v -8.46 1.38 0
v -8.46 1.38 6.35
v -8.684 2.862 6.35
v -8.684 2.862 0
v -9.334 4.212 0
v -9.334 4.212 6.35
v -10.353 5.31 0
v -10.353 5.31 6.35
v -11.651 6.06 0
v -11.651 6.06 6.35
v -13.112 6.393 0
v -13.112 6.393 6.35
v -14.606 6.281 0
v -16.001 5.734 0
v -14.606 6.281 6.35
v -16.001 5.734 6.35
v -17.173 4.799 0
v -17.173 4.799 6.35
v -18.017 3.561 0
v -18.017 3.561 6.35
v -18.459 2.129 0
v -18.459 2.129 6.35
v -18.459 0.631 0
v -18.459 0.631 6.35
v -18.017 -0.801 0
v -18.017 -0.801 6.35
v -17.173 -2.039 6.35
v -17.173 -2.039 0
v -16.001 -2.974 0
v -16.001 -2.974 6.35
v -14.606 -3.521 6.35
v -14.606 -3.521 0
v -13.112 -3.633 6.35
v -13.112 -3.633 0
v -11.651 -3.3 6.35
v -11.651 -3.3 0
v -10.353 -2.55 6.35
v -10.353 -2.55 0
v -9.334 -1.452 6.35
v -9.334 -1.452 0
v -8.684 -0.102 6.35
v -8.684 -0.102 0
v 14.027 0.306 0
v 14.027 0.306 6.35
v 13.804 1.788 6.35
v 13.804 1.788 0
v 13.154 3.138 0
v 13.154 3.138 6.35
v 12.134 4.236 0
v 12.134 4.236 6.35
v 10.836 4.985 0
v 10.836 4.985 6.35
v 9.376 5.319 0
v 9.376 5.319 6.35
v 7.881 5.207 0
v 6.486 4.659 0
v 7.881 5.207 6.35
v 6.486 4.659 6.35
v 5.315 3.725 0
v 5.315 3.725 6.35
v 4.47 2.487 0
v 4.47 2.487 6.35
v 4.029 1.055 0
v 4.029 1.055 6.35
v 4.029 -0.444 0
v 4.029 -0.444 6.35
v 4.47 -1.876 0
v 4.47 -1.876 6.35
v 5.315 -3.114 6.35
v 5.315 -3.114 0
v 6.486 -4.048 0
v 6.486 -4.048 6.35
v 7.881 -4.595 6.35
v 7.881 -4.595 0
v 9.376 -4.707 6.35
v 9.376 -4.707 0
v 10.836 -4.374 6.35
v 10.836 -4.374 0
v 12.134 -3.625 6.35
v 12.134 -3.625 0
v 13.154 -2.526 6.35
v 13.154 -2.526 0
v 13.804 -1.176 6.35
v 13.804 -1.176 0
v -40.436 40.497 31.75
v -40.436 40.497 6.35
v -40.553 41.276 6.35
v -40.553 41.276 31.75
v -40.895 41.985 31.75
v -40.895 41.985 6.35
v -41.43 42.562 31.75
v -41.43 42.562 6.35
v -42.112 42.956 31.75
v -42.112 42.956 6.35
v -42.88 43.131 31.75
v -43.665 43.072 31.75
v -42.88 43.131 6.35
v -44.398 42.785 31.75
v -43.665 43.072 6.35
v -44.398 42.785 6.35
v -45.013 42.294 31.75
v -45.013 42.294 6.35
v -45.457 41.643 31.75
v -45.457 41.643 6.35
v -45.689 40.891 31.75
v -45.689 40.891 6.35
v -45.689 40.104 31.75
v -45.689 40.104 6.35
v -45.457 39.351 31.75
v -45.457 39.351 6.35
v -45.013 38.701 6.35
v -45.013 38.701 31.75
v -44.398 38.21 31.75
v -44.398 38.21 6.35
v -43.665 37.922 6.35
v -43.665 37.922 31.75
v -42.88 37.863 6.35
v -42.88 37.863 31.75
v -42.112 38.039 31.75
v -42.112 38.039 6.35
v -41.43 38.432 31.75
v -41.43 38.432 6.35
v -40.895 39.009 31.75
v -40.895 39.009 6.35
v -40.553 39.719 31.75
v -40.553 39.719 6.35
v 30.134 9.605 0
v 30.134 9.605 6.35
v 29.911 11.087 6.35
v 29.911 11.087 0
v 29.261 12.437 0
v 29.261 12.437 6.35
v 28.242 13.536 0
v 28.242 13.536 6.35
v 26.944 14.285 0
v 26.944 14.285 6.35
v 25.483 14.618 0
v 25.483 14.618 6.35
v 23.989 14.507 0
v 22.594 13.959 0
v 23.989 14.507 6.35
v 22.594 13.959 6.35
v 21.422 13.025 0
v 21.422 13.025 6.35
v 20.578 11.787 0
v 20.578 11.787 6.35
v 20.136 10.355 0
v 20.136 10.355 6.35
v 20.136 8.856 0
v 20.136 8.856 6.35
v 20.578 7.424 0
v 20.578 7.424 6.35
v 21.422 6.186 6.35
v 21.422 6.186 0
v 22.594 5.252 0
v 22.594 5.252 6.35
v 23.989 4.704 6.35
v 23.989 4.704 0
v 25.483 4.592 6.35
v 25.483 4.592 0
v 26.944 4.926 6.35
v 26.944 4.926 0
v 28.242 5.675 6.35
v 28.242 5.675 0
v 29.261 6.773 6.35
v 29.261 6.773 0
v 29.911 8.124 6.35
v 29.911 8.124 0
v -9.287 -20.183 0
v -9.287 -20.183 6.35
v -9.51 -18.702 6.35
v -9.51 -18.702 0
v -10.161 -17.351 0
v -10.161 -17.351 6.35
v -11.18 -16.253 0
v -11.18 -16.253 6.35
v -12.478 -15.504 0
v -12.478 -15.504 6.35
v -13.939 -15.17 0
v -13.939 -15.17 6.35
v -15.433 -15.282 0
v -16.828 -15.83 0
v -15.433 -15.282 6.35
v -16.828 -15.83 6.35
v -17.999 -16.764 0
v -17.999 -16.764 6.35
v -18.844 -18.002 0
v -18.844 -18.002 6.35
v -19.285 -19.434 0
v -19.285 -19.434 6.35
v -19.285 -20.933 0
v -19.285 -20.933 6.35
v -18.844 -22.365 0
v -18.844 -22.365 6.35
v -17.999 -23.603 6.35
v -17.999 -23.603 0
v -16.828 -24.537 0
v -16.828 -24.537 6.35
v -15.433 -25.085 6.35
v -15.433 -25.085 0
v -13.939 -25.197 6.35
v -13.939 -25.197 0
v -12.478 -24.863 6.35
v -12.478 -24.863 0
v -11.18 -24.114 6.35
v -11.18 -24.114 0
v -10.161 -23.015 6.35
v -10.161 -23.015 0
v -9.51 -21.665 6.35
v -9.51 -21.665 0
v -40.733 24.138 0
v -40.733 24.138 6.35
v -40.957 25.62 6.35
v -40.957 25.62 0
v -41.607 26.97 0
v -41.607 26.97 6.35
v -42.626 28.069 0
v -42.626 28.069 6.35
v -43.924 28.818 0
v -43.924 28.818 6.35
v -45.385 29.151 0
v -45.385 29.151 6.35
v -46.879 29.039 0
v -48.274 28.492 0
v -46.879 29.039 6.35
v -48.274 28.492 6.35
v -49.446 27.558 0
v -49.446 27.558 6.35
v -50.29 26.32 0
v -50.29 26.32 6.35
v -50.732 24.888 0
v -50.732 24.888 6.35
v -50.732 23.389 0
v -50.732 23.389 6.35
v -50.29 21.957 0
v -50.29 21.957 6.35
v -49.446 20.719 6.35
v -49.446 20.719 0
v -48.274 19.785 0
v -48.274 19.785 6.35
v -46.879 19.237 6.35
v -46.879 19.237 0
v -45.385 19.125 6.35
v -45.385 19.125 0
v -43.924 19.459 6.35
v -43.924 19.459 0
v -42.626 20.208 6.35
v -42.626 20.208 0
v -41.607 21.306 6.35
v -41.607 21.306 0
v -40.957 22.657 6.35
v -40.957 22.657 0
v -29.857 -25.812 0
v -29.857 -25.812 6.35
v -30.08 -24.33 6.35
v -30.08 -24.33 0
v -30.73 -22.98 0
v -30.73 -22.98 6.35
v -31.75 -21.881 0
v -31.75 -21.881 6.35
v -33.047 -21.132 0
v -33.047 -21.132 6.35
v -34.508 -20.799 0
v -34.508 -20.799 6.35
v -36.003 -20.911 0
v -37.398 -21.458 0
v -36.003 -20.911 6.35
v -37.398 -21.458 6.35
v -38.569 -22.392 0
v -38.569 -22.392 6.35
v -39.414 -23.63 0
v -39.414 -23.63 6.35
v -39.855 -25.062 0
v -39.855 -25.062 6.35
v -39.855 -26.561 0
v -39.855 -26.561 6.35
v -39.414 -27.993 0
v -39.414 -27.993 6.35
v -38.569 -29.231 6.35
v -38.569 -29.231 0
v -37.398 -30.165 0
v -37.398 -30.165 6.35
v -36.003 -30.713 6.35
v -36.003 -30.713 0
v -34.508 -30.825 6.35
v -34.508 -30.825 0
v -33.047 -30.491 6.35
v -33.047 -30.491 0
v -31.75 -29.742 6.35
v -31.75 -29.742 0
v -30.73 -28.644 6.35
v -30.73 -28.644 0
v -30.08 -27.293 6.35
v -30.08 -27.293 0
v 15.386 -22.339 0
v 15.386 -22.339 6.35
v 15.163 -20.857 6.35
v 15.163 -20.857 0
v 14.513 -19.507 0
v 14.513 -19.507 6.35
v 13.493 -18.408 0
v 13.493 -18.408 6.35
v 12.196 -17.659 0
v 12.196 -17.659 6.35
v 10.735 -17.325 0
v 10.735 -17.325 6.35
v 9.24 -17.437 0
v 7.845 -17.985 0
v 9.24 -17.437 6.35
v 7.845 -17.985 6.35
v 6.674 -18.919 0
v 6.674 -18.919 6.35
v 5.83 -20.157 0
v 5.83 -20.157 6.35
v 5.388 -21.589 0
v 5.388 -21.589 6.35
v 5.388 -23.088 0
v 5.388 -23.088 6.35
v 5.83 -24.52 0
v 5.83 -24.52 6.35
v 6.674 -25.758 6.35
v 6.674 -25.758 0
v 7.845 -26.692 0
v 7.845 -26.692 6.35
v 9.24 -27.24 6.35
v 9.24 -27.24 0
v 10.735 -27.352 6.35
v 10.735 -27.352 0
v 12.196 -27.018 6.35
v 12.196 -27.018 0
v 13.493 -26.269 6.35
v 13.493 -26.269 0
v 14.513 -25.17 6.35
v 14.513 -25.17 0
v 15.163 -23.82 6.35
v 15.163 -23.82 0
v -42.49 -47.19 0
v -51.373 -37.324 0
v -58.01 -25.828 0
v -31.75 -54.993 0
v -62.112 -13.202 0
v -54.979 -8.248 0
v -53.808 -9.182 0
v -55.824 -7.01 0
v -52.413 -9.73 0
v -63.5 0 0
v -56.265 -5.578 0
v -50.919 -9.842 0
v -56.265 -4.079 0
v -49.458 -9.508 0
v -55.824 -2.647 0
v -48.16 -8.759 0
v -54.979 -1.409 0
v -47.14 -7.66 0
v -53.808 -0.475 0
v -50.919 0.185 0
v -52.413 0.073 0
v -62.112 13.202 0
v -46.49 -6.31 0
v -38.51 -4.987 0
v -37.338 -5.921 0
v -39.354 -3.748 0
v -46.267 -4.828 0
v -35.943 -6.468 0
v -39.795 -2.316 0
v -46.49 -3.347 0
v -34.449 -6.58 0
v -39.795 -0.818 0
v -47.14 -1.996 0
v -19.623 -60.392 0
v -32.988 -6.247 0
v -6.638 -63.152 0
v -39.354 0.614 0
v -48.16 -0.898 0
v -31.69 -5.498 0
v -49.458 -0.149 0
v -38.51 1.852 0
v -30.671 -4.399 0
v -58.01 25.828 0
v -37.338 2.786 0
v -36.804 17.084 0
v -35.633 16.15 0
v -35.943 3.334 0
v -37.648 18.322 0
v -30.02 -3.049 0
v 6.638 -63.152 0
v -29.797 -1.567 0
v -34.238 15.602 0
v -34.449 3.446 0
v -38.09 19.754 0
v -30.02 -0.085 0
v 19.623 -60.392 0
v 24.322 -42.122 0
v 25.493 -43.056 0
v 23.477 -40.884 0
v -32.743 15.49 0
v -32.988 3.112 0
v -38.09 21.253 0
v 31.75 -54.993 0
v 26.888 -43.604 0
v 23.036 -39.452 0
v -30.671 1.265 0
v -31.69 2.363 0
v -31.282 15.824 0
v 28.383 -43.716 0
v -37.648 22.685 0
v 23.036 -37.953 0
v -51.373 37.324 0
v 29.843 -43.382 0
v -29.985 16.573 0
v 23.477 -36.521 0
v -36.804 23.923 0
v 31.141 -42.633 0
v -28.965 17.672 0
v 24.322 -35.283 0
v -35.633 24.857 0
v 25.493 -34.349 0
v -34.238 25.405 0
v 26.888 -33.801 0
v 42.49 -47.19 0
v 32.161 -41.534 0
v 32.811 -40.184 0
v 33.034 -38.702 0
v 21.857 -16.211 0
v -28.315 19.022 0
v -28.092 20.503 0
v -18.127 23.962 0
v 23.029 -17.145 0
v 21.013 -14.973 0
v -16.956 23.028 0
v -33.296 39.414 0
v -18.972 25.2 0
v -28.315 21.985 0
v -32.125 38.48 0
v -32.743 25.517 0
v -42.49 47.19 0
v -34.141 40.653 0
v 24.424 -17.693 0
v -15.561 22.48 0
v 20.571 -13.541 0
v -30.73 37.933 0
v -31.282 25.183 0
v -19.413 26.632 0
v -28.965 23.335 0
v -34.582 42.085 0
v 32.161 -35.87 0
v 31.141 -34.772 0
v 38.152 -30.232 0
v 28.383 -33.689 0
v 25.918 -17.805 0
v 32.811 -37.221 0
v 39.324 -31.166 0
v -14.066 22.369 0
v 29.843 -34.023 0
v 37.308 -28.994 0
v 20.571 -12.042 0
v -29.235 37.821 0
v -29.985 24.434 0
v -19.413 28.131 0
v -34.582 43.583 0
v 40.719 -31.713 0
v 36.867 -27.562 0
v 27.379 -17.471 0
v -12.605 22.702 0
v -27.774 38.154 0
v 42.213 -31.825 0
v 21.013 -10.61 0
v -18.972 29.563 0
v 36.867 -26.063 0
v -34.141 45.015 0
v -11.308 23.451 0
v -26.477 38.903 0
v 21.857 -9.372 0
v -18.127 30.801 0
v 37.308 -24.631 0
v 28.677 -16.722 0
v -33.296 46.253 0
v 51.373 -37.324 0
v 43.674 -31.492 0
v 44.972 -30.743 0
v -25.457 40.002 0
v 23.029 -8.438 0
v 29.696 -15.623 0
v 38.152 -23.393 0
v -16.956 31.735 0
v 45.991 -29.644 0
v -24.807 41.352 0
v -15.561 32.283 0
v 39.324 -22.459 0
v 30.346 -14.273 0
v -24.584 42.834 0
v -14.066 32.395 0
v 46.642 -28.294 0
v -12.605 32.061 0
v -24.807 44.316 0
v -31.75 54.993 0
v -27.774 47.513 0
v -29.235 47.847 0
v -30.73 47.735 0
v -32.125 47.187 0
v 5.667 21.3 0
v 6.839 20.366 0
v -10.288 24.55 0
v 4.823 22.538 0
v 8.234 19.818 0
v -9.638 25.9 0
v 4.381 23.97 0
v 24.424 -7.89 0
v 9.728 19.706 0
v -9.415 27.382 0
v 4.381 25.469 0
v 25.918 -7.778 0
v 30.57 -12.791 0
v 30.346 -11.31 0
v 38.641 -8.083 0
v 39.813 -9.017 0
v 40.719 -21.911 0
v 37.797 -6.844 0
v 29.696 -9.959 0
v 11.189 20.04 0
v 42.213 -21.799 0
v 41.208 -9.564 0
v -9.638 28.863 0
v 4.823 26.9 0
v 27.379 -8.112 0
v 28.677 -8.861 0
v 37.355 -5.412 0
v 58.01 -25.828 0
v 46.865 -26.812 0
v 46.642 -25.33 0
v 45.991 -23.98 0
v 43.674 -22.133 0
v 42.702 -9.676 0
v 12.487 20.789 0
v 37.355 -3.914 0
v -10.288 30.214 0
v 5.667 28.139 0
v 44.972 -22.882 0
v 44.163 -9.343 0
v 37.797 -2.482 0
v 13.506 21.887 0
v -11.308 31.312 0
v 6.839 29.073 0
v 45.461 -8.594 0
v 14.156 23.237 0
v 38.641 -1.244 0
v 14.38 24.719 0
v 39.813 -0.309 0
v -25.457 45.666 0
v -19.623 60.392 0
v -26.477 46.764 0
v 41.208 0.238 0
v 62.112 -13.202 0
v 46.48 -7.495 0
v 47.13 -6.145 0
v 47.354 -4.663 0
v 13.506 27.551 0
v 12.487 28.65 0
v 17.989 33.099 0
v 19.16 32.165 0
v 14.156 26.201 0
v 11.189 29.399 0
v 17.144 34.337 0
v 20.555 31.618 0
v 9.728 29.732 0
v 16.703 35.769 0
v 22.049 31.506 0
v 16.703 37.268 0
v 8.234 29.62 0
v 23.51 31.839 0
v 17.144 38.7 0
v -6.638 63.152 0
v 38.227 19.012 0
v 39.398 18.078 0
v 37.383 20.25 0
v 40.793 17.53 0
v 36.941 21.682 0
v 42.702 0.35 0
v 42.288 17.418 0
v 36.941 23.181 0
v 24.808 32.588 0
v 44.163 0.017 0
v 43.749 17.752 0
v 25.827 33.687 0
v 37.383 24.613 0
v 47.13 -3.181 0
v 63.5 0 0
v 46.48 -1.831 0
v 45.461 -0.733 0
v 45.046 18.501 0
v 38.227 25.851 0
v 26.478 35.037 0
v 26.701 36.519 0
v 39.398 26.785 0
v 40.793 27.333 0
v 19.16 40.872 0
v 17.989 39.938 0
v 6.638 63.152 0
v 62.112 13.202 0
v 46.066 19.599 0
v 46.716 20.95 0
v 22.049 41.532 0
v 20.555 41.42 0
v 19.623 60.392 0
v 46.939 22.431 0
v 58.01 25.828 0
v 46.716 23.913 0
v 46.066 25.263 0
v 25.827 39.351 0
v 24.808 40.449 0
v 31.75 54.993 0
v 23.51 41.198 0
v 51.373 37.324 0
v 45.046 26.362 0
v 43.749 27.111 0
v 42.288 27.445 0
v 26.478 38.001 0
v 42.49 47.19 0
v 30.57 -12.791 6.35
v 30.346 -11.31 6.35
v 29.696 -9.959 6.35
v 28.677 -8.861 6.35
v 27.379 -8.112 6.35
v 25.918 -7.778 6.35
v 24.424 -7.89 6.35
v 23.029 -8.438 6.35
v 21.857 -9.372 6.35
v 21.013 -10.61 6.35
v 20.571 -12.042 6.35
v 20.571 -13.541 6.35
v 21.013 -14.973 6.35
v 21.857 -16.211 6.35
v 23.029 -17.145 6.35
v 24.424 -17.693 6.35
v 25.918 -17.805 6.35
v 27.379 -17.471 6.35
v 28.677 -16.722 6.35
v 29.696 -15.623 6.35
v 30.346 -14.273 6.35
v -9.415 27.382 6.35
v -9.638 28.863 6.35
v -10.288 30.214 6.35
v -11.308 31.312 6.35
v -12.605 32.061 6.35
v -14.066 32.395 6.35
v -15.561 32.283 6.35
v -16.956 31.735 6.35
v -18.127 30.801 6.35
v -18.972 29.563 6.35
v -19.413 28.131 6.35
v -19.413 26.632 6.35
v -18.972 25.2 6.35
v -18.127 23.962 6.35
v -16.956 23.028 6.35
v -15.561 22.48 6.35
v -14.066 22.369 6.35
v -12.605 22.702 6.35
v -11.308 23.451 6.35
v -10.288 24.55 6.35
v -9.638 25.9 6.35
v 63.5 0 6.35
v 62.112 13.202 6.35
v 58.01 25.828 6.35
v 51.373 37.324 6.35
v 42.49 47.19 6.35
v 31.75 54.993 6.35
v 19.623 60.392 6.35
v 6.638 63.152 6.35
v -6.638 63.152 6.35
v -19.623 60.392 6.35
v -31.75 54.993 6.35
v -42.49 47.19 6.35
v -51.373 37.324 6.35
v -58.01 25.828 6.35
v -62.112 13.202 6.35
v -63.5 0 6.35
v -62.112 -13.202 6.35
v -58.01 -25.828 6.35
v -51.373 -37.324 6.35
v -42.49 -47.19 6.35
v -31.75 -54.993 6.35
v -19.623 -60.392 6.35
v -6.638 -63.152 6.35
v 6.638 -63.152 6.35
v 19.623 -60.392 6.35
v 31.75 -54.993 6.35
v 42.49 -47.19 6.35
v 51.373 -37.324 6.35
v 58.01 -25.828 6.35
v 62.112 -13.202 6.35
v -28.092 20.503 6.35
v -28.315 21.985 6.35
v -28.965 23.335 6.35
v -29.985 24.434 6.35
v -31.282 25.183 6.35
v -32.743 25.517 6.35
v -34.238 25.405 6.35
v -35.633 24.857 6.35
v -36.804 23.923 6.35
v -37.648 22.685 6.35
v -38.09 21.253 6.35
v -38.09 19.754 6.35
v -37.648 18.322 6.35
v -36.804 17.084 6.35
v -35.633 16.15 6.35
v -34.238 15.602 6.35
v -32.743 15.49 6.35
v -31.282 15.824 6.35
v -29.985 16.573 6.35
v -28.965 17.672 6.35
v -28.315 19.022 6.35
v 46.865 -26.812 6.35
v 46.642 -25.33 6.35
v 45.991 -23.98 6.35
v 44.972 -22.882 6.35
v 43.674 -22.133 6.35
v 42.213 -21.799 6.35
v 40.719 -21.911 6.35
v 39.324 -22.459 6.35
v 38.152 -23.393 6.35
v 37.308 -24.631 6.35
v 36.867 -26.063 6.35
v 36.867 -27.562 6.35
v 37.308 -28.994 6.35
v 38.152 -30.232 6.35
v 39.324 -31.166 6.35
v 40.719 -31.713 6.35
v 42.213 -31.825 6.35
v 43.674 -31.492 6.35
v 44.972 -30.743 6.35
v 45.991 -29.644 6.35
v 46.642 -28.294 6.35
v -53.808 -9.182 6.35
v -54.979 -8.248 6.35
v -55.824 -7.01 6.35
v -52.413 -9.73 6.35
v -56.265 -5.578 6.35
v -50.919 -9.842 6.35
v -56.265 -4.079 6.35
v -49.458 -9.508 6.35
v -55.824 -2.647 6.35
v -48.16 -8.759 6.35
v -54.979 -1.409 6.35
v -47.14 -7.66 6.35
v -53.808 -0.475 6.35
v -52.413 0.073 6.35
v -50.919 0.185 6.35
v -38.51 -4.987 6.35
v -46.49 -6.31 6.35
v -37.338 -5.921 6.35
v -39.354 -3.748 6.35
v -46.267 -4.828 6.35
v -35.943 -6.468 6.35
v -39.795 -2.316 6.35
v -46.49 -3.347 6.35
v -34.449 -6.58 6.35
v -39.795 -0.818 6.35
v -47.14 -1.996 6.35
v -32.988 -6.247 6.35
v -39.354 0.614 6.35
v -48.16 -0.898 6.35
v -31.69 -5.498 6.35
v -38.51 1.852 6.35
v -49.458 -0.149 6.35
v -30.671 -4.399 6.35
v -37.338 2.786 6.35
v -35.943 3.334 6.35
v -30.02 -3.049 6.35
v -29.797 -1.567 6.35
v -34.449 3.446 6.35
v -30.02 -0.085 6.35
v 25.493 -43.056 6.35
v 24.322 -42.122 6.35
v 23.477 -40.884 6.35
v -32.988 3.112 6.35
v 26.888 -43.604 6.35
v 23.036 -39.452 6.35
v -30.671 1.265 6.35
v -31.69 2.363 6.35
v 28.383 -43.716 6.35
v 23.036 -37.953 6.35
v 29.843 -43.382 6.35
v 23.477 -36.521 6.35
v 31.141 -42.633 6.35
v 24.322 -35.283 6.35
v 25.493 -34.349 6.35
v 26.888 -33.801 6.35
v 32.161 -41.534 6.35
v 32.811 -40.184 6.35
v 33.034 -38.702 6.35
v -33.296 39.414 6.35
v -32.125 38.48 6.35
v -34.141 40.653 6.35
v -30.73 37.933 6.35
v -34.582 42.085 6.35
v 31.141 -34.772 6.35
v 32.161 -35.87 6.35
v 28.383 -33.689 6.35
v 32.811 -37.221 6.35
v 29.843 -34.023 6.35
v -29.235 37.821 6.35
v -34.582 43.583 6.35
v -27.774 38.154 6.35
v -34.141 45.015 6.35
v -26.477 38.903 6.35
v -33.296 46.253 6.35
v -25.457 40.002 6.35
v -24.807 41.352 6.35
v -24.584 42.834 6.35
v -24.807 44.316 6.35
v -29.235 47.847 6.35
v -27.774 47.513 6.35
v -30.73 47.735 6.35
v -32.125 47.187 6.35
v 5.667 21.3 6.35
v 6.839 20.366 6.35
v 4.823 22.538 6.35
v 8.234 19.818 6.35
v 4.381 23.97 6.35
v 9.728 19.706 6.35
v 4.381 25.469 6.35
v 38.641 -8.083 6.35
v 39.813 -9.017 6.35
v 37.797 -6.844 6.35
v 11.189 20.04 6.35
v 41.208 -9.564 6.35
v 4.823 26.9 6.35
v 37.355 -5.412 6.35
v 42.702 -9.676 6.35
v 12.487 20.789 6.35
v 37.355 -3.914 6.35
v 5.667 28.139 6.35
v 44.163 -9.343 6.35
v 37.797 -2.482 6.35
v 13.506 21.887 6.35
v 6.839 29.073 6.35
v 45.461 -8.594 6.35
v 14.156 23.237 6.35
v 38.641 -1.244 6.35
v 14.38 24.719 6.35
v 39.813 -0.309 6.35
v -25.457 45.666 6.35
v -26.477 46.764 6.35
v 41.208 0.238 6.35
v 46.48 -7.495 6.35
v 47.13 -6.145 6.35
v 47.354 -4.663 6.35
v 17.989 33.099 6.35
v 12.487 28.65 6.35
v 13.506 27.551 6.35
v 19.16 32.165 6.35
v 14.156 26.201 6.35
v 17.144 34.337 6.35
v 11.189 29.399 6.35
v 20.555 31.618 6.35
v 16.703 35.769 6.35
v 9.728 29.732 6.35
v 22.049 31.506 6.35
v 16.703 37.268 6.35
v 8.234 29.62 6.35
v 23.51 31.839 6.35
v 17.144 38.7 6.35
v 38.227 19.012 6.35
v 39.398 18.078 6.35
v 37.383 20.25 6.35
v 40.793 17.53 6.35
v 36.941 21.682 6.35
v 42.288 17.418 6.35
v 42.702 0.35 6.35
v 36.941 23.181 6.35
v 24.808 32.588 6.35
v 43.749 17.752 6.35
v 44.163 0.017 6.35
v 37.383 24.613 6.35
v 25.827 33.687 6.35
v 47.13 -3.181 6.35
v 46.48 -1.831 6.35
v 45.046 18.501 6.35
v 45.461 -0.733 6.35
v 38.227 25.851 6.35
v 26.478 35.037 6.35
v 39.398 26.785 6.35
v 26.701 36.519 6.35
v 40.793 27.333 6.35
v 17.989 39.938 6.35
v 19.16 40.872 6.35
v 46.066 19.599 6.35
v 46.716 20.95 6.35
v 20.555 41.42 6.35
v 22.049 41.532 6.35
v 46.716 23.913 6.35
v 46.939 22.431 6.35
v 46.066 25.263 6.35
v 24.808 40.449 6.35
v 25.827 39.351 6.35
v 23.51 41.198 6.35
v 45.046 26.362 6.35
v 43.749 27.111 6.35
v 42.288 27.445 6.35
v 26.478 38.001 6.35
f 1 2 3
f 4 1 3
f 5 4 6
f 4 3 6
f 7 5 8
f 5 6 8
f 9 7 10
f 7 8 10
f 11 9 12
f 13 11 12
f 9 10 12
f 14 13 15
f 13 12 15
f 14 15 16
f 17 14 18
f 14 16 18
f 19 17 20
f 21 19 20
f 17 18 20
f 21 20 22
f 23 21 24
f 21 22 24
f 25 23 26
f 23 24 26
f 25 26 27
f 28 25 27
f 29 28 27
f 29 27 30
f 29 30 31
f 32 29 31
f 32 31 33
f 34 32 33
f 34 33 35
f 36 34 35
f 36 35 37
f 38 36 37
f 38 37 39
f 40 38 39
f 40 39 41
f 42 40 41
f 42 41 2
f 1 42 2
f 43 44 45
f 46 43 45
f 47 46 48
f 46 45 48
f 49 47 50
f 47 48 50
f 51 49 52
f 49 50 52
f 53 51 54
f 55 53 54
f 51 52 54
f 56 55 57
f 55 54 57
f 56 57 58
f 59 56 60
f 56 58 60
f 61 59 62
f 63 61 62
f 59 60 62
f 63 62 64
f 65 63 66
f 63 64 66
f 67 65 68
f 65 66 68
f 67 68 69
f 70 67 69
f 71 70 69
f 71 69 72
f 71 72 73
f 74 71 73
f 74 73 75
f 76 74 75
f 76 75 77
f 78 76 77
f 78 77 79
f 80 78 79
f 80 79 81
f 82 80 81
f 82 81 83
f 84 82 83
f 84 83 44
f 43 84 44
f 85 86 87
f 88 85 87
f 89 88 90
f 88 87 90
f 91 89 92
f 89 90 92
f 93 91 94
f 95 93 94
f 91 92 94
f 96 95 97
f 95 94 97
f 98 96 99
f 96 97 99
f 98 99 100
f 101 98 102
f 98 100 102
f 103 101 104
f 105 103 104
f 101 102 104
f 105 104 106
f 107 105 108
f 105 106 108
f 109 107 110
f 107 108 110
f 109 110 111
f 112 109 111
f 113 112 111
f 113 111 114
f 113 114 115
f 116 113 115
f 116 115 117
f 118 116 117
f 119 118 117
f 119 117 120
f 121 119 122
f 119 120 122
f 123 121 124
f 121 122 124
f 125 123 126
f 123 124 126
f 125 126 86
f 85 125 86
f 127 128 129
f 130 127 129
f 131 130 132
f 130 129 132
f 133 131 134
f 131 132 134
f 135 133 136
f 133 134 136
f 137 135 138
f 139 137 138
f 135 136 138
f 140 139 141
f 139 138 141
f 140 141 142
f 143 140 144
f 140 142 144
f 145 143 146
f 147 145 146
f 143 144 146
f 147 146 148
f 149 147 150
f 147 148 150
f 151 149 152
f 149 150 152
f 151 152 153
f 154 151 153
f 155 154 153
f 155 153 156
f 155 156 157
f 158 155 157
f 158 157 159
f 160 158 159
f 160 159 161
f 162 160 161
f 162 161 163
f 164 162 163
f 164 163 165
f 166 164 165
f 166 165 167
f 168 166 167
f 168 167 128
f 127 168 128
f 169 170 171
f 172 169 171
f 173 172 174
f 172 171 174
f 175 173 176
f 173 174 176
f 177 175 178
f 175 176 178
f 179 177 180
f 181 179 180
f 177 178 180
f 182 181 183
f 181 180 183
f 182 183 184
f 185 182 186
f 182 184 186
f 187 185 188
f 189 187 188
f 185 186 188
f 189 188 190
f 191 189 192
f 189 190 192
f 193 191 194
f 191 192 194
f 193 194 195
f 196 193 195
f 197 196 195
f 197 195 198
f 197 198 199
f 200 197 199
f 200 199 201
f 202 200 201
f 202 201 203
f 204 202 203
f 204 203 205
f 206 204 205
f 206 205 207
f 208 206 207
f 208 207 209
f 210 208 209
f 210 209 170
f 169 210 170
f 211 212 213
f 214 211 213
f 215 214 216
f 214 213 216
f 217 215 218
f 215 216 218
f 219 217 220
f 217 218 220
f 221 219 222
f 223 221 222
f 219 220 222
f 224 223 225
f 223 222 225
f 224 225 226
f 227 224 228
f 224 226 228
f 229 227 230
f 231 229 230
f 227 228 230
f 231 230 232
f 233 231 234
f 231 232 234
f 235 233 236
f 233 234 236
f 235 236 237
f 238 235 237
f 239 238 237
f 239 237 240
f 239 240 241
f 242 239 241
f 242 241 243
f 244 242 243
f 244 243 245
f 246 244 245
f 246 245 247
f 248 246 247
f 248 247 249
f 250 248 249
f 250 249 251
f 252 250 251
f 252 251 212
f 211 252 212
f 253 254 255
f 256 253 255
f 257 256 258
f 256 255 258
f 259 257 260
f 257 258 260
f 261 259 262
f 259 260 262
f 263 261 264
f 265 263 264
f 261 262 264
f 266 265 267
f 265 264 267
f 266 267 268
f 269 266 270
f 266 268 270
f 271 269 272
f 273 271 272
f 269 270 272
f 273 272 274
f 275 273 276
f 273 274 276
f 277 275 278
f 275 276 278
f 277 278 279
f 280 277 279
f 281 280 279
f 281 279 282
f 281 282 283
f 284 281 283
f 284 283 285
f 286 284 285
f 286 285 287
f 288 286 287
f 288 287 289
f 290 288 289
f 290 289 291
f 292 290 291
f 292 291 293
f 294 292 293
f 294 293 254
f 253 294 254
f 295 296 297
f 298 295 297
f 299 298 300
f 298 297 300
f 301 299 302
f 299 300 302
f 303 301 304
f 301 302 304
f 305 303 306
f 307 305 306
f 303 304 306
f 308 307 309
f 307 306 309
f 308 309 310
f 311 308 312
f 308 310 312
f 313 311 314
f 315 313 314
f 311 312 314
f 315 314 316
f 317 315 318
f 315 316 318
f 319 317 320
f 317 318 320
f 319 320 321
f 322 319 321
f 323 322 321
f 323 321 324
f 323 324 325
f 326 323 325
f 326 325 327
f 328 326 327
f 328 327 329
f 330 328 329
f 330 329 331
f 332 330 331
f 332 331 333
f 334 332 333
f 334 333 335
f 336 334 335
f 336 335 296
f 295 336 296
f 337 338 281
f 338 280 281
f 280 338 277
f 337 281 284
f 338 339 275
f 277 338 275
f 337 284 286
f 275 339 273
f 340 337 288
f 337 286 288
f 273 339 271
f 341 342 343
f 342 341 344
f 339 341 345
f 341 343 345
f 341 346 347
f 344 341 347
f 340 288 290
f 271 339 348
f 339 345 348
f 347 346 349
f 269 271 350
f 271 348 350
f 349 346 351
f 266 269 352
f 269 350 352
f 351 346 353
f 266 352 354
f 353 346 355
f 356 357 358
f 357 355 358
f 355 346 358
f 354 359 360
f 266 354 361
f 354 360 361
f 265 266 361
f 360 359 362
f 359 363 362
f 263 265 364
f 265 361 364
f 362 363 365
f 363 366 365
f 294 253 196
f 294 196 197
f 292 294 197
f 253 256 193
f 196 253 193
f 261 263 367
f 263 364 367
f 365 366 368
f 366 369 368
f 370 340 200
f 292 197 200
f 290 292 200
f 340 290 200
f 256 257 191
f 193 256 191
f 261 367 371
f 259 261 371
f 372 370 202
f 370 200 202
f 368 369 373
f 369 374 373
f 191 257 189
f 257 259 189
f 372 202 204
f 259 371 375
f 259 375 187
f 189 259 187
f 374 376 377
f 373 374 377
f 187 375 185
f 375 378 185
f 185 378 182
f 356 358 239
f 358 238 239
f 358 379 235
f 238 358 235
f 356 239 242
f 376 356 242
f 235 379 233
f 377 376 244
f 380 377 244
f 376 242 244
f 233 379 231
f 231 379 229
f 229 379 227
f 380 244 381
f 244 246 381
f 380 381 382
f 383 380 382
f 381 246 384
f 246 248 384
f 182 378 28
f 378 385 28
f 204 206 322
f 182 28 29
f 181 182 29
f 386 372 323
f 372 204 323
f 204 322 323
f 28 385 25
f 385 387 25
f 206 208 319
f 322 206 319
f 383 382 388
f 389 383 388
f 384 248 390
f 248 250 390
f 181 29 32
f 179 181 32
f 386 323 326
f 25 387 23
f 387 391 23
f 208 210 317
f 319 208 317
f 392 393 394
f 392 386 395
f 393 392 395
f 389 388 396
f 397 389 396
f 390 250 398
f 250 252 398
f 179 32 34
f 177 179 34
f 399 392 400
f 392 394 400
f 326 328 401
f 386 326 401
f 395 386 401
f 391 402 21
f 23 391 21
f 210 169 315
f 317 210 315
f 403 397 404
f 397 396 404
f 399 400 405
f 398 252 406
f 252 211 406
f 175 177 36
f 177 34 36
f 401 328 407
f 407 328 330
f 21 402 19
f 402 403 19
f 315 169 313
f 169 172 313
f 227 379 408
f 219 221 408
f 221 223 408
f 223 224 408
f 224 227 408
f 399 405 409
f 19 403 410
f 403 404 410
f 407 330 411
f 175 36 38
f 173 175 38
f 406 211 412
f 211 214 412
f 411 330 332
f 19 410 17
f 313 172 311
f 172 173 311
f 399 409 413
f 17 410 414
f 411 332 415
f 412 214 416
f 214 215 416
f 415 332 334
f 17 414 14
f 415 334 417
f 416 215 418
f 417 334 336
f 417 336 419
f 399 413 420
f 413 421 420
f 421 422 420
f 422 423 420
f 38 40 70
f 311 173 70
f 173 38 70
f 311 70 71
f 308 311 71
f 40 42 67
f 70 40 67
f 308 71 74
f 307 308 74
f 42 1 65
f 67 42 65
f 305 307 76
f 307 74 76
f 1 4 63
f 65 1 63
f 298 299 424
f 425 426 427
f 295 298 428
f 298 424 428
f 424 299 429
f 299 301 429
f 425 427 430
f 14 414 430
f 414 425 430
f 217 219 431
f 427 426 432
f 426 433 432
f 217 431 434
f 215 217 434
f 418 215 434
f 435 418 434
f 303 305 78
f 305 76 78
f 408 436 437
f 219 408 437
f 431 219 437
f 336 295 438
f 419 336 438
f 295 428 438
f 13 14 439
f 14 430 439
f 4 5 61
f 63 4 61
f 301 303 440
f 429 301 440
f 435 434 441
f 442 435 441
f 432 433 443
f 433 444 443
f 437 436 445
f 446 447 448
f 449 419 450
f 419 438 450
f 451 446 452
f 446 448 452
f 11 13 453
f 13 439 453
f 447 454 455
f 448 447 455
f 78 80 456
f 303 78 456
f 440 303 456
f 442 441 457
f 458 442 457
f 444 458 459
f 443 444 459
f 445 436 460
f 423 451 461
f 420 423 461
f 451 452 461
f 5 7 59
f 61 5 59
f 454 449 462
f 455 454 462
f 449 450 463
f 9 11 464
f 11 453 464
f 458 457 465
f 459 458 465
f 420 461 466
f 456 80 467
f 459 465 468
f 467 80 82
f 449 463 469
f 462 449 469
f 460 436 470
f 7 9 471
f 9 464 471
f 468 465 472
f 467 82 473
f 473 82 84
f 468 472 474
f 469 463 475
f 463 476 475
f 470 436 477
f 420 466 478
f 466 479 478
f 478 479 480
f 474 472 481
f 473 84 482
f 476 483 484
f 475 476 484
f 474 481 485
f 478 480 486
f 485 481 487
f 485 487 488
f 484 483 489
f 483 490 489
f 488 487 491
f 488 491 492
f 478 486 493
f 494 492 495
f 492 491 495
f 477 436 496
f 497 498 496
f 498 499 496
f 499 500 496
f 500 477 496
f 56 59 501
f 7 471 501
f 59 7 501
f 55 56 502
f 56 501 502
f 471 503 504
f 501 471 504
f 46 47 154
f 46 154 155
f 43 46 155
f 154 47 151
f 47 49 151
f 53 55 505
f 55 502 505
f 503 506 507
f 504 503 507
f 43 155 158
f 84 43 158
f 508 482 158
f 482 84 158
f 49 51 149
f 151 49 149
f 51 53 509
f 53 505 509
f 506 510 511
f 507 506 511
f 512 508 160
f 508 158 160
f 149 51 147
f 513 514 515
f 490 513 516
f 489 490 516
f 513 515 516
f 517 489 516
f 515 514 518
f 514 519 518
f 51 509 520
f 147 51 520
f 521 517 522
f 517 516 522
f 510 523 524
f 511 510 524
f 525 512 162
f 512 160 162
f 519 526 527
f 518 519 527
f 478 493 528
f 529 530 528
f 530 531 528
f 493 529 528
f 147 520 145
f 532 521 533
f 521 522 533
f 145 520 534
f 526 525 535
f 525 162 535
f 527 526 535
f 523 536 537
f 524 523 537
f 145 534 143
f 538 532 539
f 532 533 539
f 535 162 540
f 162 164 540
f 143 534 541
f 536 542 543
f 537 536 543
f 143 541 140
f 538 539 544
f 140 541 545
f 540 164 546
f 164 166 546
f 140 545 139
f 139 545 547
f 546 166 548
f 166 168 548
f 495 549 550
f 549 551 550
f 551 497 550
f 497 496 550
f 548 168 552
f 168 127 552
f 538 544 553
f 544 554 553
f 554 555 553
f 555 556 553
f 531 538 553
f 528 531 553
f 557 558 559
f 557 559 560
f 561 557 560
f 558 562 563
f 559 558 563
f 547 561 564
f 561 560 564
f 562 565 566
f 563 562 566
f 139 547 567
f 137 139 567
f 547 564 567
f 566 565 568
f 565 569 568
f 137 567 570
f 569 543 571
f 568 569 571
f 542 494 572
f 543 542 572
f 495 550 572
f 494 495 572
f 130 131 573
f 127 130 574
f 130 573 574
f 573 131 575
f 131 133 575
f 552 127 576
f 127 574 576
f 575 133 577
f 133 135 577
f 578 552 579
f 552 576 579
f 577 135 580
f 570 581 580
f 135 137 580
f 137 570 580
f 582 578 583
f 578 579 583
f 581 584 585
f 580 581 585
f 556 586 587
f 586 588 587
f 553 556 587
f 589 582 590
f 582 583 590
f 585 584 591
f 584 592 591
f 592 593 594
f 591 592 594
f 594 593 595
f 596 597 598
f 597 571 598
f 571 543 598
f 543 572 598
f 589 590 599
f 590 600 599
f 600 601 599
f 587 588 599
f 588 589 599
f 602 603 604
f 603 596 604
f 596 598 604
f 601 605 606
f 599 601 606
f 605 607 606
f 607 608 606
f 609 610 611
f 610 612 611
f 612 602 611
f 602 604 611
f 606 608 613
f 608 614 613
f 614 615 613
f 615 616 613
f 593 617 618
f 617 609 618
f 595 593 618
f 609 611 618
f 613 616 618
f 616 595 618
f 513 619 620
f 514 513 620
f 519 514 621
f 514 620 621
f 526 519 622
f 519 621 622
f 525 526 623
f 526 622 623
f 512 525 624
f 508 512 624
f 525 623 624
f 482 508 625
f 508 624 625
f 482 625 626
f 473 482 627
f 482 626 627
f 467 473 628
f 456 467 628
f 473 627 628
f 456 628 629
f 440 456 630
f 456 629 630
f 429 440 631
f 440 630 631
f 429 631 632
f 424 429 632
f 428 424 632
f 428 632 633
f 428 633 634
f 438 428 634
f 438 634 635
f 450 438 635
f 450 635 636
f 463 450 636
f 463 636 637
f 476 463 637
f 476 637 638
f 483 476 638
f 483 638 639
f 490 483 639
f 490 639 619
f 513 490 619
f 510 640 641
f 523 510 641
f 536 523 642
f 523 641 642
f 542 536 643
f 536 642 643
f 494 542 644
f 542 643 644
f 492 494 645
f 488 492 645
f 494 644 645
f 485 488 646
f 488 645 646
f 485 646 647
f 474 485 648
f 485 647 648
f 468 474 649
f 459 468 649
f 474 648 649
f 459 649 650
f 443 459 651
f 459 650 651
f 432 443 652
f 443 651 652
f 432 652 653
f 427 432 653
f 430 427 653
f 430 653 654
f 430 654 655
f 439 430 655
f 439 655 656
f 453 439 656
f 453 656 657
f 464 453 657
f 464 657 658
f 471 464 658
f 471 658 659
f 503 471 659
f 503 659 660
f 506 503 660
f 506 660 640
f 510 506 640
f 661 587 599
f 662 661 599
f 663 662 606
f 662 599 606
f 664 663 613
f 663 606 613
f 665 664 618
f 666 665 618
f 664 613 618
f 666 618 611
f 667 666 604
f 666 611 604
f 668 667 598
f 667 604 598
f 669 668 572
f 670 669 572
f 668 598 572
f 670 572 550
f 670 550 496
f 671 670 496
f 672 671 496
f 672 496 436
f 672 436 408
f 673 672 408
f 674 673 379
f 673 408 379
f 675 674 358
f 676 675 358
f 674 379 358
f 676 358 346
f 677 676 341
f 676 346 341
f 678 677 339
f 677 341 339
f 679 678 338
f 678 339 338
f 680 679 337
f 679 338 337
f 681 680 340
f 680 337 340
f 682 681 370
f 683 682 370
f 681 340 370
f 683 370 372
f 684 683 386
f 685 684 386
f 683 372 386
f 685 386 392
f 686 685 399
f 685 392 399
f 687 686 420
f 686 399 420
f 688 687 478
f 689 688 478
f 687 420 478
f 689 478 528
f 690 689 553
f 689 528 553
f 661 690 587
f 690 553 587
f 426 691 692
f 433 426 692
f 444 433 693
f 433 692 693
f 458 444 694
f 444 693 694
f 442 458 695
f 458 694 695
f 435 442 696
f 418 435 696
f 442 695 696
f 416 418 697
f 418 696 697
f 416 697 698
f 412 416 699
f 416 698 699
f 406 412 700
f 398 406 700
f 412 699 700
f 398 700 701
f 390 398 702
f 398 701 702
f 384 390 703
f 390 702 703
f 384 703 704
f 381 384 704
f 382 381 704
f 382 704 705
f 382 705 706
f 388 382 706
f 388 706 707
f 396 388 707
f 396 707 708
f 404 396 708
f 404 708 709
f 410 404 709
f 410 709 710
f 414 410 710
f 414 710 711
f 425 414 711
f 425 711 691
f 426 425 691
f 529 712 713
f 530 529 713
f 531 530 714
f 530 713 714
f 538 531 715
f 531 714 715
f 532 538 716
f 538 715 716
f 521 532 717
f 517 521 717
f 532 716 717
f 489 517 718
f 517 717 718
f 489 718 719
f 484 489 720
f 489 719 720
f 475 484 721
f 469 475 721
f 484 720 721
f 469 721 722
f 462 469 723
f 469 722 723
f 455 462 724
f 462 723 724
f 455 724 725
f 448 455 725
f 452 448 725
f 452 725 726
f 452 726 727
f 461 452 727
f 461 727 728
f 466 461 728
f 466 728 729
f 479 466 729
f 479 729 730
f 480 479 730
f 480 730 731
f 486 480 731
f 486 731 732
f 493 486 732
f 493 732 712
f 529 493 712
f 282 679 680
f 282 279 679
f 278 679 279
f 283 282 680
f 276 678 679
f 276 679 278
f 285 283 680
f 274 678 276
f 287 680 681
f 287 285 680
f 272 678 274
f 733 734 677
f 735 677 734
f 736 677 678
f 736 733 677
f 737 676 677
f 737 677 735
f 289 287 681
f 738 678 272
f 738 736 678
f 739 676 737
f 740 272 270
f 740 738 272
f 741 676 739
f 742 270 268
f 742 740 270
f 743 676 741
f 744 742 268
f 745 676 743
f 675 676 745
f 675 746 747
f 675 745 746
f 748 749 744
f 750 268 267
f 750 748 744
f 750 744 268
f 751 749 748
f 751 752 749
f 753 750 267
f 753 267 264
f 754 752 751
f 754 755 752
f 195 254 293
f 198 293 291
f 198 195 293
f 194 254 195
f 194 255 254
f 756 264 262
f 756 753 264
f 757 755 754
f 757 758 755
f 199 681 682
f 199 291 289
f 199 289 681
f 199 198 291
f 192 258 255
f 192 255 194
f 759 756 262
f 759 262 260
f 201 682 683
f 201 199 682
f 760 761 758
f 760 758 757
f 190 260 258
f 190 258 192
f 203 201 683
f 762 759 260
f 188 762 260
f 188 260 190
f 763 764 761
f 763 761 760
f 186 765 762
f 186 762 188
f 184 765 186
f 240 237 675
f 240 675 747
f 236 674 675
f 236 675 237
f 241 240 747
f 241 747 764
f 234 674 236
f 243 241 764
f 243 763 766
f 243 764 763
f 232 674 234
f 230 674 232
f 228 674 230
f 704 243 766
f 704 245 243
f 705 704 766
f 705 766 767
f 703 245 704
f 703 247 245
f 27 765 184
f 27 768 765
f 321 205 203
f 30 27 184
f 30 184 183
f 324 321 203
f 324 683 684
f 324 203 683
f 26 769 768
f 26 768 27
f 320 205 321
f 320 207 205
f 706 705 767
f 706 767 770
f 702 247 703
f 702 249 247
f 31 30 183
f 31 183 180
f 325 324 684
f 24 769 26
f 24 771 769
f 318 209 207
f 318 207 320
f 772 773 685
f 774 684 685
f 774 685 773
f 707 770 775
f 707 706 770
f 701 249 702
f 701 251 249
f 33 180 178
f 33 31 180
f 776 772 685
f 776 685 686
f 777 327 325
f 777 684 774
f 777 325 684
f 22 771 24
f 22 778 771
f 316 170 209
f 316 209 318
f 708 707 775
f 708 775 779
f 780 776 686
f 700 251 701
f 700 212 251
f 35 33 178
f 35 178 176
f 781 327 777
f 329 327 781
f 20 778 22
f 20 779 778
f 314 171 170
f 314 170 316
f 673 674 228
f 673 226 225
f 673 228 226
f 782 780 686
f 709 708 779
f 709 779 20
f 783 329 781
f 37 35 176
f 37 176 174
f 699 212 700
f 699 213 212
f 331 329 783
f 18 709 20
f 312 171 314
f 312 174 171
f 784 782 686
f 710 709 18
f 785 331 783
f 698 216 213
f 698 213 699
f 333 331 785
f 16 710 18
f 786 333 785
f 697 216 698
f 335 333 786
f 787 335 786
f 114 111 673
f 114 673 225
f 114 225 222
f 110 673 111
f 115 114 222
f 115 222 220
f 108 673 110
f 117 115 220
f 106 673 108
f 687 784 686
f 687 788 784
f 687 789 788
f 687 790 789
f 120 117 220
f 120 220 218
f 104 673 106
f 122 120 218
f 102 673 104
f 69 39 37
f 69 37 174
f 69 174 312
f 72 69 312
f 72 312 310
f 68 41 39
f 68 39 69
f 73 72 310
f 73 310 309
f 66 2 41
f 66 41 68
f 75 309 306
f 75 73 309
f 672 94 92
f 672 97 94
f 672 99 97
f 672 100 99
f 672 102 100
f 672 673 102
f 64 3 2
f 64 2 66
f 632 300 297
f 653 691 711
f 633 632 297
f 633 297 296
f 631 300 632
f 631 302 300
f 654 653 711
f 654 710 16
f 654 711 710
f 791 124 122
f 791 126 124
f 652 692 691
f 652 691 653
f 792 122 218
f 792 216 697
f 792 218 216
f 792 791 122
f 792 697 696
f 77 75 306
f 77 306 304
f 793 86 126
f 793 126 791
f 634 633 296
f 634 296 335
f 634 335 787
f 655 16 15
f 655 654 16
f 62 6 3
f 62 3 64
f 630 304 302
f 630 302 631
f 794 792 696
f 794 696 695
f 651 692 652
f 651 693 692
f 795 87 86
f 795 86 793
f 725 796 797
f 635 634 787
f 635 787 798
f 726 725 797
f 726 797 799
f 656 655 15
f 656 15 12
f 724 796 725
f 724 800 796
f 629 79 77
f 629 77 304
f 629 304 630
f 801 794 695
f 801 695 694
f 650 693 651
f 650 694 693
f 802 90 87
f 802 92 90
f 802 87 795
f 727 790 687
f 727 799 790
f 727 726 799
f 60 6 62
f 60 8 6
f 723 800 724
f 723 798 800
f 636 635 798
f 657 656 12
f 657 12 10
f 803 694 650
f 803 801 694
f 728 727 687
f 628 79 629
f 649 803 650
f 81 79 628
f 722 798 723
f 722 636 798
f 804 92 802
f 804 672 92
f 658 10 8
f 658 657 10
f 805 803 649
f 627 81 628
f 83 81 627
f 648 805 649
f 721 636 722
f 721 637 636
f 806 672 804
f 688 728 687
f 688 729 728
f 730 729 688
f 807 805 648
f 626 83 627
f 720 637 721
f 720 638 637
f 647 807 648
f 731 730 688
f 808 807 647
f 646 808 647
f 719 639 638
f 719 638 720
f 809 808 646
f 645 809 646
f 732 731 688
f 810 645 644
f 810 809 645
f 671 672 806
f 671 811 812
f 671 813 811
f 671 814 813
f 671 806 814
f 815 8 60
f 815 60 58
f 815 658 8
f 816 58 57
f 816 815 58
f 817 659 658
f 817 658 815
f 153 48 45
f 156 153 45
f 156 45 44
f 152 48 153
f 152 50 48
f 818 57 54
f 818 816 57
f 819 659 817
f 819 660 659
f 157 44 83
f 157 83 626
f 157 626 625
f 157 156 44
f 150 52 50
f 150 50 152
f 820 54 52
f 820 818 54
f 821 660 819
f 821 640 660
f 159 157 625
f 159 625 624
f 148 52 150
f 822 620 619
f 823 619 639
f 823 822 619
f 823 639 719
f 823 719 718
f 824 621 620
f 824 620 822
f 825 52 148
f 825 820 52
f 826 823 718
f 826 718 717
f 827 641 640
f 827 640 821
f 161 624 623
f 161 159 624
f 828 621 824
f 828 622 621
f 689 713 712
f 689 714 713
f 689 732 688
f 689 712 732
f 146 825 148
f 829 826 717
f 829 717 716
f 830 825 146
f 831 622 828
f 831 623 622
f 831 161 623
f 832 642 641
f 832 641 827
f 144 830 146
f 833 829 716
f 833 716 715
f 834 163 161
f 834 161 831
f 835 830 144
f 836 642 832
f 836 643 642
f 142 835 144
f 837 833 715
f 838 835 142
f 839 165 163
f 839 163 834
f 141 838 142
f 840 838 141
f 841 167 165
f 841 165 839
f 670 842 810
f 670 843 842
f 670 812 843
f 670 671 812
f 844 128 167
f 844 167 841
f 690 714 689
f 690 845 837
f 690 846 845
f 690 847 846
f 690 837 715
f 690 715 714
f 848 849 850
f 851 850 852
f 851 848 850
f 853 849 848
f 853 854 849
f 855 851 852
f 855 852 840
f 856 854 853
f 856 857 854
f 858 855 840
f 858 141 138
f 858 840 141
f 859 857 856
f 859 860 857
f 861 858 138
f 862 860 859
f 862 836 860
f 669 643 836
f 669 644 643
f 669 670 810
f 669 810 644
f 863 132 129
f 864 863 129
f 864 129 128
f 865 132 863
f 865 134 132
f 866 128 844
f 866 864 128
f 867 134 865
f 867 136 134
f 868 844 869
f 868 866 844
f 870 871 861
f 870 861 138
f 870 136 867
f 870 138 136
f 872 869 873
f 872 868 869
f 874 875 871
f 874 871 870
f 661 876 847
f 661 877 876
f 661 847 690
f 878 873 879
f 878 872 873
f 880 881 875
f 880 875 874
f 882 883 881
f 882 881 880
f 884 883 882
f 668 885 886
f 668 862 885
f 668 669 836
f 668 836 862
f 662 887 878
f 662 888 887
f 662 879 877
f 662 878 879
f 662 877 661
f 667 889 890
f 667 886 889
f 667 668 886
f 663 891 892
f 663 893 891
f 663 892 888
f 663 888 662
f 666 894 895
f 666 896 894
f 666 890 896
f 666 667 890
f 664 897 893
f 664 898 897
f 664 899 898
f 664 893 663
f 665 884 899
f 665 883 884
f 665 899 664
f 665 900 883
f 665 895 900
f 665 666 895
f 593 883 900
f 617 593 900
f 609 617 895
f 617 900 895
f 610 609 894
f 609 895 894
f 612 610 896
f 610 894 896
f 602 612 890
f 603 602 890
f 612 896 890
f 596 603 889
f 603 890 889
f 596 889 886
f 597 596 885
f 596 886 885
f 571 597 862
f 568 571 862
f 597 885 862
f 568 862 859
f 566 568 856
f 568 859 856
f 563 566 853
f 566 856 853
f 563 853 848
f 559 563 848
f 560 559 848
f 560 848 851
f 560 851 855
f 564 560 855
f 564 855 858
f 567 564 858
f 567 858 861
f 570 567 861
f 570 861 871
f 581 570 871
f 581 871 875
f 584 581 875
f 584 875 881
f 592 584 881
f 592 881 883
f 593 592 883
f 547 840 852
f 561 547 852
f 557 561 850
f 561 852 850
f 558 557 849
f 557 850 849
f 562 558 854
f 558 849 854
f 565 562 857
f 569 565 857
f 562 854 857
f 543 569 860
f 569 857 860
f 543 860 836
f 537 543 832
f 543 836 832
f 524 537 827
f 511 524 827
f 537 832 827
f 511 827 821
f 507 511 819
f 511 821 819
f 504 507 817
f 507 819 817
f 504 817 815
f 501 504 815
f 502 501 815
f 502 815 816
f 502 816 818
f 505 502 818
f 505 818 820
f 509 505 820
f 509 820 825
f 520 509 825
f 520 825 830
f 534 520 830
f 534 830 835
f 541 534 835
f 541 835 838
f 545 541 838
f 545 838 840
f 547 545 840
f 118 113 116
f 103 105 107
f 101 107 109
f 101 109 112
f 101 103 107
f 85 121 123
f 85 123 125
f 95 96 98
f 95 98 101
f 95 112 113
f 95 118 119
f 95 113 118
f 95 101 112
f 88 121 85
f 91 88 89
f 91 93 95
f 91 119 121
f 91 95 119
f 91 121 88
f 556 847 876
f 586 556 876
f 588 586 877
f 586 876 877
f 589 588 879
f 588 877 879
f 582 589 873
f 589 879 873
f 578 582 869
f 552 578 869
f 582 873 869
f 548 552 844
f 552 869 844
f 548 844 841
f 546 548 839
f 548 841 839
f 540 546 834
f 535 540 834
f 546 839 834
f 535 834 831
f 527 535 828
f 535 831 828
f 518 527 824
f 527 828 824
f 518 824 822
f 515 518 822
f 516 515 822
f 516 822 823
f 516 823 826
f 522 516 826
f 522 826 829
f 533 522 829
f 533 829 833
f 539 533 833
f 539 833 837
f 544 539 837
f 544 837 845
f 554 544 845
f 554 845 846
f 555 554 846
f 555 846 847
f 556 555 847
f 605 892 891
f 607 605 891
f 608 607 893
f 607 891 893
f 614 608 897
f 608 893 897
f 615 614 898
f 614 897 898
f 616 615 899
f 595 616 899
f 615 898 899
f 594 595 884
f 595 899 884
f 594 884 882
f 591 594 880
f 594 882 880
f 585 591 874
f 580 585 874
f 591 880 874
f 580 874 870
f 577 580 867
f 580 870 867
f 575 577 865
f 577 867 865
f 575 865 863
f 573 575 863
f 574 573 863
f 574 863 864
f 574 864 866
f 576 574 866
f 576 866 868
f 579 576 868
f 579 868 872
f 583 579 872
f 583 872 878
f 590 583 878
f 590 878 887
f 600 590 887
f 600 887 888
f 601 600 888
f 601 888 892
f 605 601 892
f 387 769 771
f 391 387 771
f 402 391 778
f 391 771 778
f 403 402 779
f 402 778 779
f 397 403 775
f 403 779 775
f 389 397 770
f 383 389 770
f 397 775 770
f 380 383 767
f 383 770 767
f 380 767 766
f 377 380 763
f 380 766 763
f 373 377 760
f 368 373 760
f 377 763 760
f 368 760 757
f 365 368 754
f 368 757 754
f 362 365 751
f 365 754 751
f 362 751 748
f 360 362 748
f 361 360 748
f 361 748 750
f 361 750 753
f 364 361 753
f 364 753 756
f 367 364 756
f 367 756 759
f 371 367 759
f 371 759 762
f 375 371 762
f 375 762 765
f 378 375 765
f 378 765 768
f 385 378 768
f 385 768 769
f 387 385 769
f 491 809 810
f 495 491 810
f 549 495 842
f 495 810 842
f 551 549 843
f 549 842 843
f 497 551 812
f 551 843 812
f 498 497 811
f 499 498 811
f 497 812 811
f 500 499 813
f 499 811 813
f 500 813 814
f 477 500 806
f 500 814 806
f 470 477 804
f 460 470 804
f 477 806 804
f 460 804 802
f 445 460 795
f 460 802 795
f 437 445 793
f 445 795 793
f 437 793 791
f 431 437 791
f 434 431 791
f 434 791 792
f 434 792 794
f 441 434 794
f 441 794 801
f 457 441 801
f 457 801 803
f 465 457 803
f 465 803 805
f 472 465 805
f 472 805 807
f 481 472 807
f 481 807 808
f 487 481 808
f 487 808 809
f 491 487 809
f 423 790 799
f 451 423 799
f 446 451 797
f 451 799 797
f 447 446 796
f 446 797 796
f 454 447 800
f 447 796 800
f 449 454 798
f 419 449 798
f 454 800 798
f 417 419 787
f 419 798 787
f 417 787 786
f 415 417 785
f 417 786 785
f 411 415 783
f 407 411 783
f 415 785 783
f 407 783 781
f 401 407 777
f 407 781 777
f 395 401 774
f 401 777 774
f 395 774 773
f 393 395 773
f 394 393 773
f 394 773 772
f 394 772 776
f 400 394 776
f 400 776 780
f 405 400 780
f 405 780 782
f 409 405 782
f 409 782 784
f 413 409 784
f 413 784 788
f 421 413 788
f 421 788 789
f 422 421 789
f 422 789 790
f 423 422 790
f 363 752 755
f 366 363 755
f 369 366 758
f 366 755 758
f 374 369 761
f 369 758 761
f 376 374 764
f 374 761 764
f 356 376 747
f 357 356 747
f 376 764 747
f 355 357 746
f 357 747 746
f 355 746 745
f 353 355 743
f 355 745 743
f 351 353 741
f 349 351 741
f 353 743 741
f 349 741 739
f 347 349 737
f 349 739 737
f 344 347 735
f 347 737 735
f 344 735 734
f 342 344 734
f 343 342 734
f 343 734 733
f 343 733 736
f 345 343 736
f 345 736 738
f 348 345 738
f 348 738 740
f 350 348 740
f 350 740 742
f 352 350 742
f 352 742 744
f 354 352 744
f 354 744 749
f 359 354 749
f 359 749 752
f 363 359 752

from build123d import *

# Parameters (mm, degrees)
F0_R     = 63.5
F1_DEPTH = 6.35
F2_R     = 5.0272245411
F3_DEPTH = 25.4
F4_R     = 2.641238627
F5_DEPTH = 25.4


# Not quite as in the source:
# - the program builds the solid bodies; features that only make, move or delete a surface that nothing else refers to are left out


with BuildPart() as f1:
    # F0 (on Top) → F1 (new body)
    with BuildSketch(Plane.XY):
        Circle(F0_R)
    extrude(amount=F1_DEPTH)

    # F2 (on face) → F3 (cut)
    with BuildSketch(Plane.XY.offset(6.35)):
        with Locations((-51.2941852212, -4.8283813521)):
            Circle(F2_R)
        with Locations((-45.7605943084, 24.1383034736)):
            Circle(F2_R)
        with Locations((-29.6111274511, 42.8337752819)):
            Circle(F2_R)
        with Locations((-33.1189669669, 20.5034371465)):
            Circle(F2_R)
        with Locations((-34.8243303597, -1.5672247391)):
            Circle(F2_R)
        with Locations((-34.8841510713, -25.8116889745)):
            Circle(F2_R)
        with Locations((-14.3142268062, -20.1833639294)):
            Circle(F2_R)
        with Locations((-13.4874591604, 1.3800424058)):
            Circle(F2_R)
        with Locations((-14.4421327859, 27.3816790432)):
            Circle(F2_R)
        with Locations((21.6737631708, 36.5187302232)):
            Circle(F2_R)
        with Locations((9.3525275588, 24.7192624956)):
            Circle(F2_R)
        with Locations((8.9998366311, 0.3057096619)):
            Circle(F2_R)
        with Locations((10.3590181097, -22.3385263234)):
            Circle(F2_R)
        with Locations((28.006831184, -38.7023799121)):
            Circle(F2_R)
        with Locations((25.5425348878, -12.7913486212)):
            Circle(F2_R)
        with Locations((25.1072477549, 9.6053304151)):
            Circle(F2_R)
        with Locations((41.9120192528, 22.4314276129)):
            Circle(F2_R)
        with Locations((42.3262864351, -4.6631796286)):
            Circle(F2_R)
        with Locations((41.8376736343, -26.8122982234)):
            Circle(F2_R)
    extrude(amount=-F3_DEPTH, mode=Mode.SUBTRACT)

    # F4 (on face) → F5 (join)
    with BuildSketch(Plane.XY.offset(6.35)):
        with Locations((-43.0771894753, 40.4972620308)):
            Circle(F4_R)
    extrude(amount=F5_DEPTH)


solid = f1.part
